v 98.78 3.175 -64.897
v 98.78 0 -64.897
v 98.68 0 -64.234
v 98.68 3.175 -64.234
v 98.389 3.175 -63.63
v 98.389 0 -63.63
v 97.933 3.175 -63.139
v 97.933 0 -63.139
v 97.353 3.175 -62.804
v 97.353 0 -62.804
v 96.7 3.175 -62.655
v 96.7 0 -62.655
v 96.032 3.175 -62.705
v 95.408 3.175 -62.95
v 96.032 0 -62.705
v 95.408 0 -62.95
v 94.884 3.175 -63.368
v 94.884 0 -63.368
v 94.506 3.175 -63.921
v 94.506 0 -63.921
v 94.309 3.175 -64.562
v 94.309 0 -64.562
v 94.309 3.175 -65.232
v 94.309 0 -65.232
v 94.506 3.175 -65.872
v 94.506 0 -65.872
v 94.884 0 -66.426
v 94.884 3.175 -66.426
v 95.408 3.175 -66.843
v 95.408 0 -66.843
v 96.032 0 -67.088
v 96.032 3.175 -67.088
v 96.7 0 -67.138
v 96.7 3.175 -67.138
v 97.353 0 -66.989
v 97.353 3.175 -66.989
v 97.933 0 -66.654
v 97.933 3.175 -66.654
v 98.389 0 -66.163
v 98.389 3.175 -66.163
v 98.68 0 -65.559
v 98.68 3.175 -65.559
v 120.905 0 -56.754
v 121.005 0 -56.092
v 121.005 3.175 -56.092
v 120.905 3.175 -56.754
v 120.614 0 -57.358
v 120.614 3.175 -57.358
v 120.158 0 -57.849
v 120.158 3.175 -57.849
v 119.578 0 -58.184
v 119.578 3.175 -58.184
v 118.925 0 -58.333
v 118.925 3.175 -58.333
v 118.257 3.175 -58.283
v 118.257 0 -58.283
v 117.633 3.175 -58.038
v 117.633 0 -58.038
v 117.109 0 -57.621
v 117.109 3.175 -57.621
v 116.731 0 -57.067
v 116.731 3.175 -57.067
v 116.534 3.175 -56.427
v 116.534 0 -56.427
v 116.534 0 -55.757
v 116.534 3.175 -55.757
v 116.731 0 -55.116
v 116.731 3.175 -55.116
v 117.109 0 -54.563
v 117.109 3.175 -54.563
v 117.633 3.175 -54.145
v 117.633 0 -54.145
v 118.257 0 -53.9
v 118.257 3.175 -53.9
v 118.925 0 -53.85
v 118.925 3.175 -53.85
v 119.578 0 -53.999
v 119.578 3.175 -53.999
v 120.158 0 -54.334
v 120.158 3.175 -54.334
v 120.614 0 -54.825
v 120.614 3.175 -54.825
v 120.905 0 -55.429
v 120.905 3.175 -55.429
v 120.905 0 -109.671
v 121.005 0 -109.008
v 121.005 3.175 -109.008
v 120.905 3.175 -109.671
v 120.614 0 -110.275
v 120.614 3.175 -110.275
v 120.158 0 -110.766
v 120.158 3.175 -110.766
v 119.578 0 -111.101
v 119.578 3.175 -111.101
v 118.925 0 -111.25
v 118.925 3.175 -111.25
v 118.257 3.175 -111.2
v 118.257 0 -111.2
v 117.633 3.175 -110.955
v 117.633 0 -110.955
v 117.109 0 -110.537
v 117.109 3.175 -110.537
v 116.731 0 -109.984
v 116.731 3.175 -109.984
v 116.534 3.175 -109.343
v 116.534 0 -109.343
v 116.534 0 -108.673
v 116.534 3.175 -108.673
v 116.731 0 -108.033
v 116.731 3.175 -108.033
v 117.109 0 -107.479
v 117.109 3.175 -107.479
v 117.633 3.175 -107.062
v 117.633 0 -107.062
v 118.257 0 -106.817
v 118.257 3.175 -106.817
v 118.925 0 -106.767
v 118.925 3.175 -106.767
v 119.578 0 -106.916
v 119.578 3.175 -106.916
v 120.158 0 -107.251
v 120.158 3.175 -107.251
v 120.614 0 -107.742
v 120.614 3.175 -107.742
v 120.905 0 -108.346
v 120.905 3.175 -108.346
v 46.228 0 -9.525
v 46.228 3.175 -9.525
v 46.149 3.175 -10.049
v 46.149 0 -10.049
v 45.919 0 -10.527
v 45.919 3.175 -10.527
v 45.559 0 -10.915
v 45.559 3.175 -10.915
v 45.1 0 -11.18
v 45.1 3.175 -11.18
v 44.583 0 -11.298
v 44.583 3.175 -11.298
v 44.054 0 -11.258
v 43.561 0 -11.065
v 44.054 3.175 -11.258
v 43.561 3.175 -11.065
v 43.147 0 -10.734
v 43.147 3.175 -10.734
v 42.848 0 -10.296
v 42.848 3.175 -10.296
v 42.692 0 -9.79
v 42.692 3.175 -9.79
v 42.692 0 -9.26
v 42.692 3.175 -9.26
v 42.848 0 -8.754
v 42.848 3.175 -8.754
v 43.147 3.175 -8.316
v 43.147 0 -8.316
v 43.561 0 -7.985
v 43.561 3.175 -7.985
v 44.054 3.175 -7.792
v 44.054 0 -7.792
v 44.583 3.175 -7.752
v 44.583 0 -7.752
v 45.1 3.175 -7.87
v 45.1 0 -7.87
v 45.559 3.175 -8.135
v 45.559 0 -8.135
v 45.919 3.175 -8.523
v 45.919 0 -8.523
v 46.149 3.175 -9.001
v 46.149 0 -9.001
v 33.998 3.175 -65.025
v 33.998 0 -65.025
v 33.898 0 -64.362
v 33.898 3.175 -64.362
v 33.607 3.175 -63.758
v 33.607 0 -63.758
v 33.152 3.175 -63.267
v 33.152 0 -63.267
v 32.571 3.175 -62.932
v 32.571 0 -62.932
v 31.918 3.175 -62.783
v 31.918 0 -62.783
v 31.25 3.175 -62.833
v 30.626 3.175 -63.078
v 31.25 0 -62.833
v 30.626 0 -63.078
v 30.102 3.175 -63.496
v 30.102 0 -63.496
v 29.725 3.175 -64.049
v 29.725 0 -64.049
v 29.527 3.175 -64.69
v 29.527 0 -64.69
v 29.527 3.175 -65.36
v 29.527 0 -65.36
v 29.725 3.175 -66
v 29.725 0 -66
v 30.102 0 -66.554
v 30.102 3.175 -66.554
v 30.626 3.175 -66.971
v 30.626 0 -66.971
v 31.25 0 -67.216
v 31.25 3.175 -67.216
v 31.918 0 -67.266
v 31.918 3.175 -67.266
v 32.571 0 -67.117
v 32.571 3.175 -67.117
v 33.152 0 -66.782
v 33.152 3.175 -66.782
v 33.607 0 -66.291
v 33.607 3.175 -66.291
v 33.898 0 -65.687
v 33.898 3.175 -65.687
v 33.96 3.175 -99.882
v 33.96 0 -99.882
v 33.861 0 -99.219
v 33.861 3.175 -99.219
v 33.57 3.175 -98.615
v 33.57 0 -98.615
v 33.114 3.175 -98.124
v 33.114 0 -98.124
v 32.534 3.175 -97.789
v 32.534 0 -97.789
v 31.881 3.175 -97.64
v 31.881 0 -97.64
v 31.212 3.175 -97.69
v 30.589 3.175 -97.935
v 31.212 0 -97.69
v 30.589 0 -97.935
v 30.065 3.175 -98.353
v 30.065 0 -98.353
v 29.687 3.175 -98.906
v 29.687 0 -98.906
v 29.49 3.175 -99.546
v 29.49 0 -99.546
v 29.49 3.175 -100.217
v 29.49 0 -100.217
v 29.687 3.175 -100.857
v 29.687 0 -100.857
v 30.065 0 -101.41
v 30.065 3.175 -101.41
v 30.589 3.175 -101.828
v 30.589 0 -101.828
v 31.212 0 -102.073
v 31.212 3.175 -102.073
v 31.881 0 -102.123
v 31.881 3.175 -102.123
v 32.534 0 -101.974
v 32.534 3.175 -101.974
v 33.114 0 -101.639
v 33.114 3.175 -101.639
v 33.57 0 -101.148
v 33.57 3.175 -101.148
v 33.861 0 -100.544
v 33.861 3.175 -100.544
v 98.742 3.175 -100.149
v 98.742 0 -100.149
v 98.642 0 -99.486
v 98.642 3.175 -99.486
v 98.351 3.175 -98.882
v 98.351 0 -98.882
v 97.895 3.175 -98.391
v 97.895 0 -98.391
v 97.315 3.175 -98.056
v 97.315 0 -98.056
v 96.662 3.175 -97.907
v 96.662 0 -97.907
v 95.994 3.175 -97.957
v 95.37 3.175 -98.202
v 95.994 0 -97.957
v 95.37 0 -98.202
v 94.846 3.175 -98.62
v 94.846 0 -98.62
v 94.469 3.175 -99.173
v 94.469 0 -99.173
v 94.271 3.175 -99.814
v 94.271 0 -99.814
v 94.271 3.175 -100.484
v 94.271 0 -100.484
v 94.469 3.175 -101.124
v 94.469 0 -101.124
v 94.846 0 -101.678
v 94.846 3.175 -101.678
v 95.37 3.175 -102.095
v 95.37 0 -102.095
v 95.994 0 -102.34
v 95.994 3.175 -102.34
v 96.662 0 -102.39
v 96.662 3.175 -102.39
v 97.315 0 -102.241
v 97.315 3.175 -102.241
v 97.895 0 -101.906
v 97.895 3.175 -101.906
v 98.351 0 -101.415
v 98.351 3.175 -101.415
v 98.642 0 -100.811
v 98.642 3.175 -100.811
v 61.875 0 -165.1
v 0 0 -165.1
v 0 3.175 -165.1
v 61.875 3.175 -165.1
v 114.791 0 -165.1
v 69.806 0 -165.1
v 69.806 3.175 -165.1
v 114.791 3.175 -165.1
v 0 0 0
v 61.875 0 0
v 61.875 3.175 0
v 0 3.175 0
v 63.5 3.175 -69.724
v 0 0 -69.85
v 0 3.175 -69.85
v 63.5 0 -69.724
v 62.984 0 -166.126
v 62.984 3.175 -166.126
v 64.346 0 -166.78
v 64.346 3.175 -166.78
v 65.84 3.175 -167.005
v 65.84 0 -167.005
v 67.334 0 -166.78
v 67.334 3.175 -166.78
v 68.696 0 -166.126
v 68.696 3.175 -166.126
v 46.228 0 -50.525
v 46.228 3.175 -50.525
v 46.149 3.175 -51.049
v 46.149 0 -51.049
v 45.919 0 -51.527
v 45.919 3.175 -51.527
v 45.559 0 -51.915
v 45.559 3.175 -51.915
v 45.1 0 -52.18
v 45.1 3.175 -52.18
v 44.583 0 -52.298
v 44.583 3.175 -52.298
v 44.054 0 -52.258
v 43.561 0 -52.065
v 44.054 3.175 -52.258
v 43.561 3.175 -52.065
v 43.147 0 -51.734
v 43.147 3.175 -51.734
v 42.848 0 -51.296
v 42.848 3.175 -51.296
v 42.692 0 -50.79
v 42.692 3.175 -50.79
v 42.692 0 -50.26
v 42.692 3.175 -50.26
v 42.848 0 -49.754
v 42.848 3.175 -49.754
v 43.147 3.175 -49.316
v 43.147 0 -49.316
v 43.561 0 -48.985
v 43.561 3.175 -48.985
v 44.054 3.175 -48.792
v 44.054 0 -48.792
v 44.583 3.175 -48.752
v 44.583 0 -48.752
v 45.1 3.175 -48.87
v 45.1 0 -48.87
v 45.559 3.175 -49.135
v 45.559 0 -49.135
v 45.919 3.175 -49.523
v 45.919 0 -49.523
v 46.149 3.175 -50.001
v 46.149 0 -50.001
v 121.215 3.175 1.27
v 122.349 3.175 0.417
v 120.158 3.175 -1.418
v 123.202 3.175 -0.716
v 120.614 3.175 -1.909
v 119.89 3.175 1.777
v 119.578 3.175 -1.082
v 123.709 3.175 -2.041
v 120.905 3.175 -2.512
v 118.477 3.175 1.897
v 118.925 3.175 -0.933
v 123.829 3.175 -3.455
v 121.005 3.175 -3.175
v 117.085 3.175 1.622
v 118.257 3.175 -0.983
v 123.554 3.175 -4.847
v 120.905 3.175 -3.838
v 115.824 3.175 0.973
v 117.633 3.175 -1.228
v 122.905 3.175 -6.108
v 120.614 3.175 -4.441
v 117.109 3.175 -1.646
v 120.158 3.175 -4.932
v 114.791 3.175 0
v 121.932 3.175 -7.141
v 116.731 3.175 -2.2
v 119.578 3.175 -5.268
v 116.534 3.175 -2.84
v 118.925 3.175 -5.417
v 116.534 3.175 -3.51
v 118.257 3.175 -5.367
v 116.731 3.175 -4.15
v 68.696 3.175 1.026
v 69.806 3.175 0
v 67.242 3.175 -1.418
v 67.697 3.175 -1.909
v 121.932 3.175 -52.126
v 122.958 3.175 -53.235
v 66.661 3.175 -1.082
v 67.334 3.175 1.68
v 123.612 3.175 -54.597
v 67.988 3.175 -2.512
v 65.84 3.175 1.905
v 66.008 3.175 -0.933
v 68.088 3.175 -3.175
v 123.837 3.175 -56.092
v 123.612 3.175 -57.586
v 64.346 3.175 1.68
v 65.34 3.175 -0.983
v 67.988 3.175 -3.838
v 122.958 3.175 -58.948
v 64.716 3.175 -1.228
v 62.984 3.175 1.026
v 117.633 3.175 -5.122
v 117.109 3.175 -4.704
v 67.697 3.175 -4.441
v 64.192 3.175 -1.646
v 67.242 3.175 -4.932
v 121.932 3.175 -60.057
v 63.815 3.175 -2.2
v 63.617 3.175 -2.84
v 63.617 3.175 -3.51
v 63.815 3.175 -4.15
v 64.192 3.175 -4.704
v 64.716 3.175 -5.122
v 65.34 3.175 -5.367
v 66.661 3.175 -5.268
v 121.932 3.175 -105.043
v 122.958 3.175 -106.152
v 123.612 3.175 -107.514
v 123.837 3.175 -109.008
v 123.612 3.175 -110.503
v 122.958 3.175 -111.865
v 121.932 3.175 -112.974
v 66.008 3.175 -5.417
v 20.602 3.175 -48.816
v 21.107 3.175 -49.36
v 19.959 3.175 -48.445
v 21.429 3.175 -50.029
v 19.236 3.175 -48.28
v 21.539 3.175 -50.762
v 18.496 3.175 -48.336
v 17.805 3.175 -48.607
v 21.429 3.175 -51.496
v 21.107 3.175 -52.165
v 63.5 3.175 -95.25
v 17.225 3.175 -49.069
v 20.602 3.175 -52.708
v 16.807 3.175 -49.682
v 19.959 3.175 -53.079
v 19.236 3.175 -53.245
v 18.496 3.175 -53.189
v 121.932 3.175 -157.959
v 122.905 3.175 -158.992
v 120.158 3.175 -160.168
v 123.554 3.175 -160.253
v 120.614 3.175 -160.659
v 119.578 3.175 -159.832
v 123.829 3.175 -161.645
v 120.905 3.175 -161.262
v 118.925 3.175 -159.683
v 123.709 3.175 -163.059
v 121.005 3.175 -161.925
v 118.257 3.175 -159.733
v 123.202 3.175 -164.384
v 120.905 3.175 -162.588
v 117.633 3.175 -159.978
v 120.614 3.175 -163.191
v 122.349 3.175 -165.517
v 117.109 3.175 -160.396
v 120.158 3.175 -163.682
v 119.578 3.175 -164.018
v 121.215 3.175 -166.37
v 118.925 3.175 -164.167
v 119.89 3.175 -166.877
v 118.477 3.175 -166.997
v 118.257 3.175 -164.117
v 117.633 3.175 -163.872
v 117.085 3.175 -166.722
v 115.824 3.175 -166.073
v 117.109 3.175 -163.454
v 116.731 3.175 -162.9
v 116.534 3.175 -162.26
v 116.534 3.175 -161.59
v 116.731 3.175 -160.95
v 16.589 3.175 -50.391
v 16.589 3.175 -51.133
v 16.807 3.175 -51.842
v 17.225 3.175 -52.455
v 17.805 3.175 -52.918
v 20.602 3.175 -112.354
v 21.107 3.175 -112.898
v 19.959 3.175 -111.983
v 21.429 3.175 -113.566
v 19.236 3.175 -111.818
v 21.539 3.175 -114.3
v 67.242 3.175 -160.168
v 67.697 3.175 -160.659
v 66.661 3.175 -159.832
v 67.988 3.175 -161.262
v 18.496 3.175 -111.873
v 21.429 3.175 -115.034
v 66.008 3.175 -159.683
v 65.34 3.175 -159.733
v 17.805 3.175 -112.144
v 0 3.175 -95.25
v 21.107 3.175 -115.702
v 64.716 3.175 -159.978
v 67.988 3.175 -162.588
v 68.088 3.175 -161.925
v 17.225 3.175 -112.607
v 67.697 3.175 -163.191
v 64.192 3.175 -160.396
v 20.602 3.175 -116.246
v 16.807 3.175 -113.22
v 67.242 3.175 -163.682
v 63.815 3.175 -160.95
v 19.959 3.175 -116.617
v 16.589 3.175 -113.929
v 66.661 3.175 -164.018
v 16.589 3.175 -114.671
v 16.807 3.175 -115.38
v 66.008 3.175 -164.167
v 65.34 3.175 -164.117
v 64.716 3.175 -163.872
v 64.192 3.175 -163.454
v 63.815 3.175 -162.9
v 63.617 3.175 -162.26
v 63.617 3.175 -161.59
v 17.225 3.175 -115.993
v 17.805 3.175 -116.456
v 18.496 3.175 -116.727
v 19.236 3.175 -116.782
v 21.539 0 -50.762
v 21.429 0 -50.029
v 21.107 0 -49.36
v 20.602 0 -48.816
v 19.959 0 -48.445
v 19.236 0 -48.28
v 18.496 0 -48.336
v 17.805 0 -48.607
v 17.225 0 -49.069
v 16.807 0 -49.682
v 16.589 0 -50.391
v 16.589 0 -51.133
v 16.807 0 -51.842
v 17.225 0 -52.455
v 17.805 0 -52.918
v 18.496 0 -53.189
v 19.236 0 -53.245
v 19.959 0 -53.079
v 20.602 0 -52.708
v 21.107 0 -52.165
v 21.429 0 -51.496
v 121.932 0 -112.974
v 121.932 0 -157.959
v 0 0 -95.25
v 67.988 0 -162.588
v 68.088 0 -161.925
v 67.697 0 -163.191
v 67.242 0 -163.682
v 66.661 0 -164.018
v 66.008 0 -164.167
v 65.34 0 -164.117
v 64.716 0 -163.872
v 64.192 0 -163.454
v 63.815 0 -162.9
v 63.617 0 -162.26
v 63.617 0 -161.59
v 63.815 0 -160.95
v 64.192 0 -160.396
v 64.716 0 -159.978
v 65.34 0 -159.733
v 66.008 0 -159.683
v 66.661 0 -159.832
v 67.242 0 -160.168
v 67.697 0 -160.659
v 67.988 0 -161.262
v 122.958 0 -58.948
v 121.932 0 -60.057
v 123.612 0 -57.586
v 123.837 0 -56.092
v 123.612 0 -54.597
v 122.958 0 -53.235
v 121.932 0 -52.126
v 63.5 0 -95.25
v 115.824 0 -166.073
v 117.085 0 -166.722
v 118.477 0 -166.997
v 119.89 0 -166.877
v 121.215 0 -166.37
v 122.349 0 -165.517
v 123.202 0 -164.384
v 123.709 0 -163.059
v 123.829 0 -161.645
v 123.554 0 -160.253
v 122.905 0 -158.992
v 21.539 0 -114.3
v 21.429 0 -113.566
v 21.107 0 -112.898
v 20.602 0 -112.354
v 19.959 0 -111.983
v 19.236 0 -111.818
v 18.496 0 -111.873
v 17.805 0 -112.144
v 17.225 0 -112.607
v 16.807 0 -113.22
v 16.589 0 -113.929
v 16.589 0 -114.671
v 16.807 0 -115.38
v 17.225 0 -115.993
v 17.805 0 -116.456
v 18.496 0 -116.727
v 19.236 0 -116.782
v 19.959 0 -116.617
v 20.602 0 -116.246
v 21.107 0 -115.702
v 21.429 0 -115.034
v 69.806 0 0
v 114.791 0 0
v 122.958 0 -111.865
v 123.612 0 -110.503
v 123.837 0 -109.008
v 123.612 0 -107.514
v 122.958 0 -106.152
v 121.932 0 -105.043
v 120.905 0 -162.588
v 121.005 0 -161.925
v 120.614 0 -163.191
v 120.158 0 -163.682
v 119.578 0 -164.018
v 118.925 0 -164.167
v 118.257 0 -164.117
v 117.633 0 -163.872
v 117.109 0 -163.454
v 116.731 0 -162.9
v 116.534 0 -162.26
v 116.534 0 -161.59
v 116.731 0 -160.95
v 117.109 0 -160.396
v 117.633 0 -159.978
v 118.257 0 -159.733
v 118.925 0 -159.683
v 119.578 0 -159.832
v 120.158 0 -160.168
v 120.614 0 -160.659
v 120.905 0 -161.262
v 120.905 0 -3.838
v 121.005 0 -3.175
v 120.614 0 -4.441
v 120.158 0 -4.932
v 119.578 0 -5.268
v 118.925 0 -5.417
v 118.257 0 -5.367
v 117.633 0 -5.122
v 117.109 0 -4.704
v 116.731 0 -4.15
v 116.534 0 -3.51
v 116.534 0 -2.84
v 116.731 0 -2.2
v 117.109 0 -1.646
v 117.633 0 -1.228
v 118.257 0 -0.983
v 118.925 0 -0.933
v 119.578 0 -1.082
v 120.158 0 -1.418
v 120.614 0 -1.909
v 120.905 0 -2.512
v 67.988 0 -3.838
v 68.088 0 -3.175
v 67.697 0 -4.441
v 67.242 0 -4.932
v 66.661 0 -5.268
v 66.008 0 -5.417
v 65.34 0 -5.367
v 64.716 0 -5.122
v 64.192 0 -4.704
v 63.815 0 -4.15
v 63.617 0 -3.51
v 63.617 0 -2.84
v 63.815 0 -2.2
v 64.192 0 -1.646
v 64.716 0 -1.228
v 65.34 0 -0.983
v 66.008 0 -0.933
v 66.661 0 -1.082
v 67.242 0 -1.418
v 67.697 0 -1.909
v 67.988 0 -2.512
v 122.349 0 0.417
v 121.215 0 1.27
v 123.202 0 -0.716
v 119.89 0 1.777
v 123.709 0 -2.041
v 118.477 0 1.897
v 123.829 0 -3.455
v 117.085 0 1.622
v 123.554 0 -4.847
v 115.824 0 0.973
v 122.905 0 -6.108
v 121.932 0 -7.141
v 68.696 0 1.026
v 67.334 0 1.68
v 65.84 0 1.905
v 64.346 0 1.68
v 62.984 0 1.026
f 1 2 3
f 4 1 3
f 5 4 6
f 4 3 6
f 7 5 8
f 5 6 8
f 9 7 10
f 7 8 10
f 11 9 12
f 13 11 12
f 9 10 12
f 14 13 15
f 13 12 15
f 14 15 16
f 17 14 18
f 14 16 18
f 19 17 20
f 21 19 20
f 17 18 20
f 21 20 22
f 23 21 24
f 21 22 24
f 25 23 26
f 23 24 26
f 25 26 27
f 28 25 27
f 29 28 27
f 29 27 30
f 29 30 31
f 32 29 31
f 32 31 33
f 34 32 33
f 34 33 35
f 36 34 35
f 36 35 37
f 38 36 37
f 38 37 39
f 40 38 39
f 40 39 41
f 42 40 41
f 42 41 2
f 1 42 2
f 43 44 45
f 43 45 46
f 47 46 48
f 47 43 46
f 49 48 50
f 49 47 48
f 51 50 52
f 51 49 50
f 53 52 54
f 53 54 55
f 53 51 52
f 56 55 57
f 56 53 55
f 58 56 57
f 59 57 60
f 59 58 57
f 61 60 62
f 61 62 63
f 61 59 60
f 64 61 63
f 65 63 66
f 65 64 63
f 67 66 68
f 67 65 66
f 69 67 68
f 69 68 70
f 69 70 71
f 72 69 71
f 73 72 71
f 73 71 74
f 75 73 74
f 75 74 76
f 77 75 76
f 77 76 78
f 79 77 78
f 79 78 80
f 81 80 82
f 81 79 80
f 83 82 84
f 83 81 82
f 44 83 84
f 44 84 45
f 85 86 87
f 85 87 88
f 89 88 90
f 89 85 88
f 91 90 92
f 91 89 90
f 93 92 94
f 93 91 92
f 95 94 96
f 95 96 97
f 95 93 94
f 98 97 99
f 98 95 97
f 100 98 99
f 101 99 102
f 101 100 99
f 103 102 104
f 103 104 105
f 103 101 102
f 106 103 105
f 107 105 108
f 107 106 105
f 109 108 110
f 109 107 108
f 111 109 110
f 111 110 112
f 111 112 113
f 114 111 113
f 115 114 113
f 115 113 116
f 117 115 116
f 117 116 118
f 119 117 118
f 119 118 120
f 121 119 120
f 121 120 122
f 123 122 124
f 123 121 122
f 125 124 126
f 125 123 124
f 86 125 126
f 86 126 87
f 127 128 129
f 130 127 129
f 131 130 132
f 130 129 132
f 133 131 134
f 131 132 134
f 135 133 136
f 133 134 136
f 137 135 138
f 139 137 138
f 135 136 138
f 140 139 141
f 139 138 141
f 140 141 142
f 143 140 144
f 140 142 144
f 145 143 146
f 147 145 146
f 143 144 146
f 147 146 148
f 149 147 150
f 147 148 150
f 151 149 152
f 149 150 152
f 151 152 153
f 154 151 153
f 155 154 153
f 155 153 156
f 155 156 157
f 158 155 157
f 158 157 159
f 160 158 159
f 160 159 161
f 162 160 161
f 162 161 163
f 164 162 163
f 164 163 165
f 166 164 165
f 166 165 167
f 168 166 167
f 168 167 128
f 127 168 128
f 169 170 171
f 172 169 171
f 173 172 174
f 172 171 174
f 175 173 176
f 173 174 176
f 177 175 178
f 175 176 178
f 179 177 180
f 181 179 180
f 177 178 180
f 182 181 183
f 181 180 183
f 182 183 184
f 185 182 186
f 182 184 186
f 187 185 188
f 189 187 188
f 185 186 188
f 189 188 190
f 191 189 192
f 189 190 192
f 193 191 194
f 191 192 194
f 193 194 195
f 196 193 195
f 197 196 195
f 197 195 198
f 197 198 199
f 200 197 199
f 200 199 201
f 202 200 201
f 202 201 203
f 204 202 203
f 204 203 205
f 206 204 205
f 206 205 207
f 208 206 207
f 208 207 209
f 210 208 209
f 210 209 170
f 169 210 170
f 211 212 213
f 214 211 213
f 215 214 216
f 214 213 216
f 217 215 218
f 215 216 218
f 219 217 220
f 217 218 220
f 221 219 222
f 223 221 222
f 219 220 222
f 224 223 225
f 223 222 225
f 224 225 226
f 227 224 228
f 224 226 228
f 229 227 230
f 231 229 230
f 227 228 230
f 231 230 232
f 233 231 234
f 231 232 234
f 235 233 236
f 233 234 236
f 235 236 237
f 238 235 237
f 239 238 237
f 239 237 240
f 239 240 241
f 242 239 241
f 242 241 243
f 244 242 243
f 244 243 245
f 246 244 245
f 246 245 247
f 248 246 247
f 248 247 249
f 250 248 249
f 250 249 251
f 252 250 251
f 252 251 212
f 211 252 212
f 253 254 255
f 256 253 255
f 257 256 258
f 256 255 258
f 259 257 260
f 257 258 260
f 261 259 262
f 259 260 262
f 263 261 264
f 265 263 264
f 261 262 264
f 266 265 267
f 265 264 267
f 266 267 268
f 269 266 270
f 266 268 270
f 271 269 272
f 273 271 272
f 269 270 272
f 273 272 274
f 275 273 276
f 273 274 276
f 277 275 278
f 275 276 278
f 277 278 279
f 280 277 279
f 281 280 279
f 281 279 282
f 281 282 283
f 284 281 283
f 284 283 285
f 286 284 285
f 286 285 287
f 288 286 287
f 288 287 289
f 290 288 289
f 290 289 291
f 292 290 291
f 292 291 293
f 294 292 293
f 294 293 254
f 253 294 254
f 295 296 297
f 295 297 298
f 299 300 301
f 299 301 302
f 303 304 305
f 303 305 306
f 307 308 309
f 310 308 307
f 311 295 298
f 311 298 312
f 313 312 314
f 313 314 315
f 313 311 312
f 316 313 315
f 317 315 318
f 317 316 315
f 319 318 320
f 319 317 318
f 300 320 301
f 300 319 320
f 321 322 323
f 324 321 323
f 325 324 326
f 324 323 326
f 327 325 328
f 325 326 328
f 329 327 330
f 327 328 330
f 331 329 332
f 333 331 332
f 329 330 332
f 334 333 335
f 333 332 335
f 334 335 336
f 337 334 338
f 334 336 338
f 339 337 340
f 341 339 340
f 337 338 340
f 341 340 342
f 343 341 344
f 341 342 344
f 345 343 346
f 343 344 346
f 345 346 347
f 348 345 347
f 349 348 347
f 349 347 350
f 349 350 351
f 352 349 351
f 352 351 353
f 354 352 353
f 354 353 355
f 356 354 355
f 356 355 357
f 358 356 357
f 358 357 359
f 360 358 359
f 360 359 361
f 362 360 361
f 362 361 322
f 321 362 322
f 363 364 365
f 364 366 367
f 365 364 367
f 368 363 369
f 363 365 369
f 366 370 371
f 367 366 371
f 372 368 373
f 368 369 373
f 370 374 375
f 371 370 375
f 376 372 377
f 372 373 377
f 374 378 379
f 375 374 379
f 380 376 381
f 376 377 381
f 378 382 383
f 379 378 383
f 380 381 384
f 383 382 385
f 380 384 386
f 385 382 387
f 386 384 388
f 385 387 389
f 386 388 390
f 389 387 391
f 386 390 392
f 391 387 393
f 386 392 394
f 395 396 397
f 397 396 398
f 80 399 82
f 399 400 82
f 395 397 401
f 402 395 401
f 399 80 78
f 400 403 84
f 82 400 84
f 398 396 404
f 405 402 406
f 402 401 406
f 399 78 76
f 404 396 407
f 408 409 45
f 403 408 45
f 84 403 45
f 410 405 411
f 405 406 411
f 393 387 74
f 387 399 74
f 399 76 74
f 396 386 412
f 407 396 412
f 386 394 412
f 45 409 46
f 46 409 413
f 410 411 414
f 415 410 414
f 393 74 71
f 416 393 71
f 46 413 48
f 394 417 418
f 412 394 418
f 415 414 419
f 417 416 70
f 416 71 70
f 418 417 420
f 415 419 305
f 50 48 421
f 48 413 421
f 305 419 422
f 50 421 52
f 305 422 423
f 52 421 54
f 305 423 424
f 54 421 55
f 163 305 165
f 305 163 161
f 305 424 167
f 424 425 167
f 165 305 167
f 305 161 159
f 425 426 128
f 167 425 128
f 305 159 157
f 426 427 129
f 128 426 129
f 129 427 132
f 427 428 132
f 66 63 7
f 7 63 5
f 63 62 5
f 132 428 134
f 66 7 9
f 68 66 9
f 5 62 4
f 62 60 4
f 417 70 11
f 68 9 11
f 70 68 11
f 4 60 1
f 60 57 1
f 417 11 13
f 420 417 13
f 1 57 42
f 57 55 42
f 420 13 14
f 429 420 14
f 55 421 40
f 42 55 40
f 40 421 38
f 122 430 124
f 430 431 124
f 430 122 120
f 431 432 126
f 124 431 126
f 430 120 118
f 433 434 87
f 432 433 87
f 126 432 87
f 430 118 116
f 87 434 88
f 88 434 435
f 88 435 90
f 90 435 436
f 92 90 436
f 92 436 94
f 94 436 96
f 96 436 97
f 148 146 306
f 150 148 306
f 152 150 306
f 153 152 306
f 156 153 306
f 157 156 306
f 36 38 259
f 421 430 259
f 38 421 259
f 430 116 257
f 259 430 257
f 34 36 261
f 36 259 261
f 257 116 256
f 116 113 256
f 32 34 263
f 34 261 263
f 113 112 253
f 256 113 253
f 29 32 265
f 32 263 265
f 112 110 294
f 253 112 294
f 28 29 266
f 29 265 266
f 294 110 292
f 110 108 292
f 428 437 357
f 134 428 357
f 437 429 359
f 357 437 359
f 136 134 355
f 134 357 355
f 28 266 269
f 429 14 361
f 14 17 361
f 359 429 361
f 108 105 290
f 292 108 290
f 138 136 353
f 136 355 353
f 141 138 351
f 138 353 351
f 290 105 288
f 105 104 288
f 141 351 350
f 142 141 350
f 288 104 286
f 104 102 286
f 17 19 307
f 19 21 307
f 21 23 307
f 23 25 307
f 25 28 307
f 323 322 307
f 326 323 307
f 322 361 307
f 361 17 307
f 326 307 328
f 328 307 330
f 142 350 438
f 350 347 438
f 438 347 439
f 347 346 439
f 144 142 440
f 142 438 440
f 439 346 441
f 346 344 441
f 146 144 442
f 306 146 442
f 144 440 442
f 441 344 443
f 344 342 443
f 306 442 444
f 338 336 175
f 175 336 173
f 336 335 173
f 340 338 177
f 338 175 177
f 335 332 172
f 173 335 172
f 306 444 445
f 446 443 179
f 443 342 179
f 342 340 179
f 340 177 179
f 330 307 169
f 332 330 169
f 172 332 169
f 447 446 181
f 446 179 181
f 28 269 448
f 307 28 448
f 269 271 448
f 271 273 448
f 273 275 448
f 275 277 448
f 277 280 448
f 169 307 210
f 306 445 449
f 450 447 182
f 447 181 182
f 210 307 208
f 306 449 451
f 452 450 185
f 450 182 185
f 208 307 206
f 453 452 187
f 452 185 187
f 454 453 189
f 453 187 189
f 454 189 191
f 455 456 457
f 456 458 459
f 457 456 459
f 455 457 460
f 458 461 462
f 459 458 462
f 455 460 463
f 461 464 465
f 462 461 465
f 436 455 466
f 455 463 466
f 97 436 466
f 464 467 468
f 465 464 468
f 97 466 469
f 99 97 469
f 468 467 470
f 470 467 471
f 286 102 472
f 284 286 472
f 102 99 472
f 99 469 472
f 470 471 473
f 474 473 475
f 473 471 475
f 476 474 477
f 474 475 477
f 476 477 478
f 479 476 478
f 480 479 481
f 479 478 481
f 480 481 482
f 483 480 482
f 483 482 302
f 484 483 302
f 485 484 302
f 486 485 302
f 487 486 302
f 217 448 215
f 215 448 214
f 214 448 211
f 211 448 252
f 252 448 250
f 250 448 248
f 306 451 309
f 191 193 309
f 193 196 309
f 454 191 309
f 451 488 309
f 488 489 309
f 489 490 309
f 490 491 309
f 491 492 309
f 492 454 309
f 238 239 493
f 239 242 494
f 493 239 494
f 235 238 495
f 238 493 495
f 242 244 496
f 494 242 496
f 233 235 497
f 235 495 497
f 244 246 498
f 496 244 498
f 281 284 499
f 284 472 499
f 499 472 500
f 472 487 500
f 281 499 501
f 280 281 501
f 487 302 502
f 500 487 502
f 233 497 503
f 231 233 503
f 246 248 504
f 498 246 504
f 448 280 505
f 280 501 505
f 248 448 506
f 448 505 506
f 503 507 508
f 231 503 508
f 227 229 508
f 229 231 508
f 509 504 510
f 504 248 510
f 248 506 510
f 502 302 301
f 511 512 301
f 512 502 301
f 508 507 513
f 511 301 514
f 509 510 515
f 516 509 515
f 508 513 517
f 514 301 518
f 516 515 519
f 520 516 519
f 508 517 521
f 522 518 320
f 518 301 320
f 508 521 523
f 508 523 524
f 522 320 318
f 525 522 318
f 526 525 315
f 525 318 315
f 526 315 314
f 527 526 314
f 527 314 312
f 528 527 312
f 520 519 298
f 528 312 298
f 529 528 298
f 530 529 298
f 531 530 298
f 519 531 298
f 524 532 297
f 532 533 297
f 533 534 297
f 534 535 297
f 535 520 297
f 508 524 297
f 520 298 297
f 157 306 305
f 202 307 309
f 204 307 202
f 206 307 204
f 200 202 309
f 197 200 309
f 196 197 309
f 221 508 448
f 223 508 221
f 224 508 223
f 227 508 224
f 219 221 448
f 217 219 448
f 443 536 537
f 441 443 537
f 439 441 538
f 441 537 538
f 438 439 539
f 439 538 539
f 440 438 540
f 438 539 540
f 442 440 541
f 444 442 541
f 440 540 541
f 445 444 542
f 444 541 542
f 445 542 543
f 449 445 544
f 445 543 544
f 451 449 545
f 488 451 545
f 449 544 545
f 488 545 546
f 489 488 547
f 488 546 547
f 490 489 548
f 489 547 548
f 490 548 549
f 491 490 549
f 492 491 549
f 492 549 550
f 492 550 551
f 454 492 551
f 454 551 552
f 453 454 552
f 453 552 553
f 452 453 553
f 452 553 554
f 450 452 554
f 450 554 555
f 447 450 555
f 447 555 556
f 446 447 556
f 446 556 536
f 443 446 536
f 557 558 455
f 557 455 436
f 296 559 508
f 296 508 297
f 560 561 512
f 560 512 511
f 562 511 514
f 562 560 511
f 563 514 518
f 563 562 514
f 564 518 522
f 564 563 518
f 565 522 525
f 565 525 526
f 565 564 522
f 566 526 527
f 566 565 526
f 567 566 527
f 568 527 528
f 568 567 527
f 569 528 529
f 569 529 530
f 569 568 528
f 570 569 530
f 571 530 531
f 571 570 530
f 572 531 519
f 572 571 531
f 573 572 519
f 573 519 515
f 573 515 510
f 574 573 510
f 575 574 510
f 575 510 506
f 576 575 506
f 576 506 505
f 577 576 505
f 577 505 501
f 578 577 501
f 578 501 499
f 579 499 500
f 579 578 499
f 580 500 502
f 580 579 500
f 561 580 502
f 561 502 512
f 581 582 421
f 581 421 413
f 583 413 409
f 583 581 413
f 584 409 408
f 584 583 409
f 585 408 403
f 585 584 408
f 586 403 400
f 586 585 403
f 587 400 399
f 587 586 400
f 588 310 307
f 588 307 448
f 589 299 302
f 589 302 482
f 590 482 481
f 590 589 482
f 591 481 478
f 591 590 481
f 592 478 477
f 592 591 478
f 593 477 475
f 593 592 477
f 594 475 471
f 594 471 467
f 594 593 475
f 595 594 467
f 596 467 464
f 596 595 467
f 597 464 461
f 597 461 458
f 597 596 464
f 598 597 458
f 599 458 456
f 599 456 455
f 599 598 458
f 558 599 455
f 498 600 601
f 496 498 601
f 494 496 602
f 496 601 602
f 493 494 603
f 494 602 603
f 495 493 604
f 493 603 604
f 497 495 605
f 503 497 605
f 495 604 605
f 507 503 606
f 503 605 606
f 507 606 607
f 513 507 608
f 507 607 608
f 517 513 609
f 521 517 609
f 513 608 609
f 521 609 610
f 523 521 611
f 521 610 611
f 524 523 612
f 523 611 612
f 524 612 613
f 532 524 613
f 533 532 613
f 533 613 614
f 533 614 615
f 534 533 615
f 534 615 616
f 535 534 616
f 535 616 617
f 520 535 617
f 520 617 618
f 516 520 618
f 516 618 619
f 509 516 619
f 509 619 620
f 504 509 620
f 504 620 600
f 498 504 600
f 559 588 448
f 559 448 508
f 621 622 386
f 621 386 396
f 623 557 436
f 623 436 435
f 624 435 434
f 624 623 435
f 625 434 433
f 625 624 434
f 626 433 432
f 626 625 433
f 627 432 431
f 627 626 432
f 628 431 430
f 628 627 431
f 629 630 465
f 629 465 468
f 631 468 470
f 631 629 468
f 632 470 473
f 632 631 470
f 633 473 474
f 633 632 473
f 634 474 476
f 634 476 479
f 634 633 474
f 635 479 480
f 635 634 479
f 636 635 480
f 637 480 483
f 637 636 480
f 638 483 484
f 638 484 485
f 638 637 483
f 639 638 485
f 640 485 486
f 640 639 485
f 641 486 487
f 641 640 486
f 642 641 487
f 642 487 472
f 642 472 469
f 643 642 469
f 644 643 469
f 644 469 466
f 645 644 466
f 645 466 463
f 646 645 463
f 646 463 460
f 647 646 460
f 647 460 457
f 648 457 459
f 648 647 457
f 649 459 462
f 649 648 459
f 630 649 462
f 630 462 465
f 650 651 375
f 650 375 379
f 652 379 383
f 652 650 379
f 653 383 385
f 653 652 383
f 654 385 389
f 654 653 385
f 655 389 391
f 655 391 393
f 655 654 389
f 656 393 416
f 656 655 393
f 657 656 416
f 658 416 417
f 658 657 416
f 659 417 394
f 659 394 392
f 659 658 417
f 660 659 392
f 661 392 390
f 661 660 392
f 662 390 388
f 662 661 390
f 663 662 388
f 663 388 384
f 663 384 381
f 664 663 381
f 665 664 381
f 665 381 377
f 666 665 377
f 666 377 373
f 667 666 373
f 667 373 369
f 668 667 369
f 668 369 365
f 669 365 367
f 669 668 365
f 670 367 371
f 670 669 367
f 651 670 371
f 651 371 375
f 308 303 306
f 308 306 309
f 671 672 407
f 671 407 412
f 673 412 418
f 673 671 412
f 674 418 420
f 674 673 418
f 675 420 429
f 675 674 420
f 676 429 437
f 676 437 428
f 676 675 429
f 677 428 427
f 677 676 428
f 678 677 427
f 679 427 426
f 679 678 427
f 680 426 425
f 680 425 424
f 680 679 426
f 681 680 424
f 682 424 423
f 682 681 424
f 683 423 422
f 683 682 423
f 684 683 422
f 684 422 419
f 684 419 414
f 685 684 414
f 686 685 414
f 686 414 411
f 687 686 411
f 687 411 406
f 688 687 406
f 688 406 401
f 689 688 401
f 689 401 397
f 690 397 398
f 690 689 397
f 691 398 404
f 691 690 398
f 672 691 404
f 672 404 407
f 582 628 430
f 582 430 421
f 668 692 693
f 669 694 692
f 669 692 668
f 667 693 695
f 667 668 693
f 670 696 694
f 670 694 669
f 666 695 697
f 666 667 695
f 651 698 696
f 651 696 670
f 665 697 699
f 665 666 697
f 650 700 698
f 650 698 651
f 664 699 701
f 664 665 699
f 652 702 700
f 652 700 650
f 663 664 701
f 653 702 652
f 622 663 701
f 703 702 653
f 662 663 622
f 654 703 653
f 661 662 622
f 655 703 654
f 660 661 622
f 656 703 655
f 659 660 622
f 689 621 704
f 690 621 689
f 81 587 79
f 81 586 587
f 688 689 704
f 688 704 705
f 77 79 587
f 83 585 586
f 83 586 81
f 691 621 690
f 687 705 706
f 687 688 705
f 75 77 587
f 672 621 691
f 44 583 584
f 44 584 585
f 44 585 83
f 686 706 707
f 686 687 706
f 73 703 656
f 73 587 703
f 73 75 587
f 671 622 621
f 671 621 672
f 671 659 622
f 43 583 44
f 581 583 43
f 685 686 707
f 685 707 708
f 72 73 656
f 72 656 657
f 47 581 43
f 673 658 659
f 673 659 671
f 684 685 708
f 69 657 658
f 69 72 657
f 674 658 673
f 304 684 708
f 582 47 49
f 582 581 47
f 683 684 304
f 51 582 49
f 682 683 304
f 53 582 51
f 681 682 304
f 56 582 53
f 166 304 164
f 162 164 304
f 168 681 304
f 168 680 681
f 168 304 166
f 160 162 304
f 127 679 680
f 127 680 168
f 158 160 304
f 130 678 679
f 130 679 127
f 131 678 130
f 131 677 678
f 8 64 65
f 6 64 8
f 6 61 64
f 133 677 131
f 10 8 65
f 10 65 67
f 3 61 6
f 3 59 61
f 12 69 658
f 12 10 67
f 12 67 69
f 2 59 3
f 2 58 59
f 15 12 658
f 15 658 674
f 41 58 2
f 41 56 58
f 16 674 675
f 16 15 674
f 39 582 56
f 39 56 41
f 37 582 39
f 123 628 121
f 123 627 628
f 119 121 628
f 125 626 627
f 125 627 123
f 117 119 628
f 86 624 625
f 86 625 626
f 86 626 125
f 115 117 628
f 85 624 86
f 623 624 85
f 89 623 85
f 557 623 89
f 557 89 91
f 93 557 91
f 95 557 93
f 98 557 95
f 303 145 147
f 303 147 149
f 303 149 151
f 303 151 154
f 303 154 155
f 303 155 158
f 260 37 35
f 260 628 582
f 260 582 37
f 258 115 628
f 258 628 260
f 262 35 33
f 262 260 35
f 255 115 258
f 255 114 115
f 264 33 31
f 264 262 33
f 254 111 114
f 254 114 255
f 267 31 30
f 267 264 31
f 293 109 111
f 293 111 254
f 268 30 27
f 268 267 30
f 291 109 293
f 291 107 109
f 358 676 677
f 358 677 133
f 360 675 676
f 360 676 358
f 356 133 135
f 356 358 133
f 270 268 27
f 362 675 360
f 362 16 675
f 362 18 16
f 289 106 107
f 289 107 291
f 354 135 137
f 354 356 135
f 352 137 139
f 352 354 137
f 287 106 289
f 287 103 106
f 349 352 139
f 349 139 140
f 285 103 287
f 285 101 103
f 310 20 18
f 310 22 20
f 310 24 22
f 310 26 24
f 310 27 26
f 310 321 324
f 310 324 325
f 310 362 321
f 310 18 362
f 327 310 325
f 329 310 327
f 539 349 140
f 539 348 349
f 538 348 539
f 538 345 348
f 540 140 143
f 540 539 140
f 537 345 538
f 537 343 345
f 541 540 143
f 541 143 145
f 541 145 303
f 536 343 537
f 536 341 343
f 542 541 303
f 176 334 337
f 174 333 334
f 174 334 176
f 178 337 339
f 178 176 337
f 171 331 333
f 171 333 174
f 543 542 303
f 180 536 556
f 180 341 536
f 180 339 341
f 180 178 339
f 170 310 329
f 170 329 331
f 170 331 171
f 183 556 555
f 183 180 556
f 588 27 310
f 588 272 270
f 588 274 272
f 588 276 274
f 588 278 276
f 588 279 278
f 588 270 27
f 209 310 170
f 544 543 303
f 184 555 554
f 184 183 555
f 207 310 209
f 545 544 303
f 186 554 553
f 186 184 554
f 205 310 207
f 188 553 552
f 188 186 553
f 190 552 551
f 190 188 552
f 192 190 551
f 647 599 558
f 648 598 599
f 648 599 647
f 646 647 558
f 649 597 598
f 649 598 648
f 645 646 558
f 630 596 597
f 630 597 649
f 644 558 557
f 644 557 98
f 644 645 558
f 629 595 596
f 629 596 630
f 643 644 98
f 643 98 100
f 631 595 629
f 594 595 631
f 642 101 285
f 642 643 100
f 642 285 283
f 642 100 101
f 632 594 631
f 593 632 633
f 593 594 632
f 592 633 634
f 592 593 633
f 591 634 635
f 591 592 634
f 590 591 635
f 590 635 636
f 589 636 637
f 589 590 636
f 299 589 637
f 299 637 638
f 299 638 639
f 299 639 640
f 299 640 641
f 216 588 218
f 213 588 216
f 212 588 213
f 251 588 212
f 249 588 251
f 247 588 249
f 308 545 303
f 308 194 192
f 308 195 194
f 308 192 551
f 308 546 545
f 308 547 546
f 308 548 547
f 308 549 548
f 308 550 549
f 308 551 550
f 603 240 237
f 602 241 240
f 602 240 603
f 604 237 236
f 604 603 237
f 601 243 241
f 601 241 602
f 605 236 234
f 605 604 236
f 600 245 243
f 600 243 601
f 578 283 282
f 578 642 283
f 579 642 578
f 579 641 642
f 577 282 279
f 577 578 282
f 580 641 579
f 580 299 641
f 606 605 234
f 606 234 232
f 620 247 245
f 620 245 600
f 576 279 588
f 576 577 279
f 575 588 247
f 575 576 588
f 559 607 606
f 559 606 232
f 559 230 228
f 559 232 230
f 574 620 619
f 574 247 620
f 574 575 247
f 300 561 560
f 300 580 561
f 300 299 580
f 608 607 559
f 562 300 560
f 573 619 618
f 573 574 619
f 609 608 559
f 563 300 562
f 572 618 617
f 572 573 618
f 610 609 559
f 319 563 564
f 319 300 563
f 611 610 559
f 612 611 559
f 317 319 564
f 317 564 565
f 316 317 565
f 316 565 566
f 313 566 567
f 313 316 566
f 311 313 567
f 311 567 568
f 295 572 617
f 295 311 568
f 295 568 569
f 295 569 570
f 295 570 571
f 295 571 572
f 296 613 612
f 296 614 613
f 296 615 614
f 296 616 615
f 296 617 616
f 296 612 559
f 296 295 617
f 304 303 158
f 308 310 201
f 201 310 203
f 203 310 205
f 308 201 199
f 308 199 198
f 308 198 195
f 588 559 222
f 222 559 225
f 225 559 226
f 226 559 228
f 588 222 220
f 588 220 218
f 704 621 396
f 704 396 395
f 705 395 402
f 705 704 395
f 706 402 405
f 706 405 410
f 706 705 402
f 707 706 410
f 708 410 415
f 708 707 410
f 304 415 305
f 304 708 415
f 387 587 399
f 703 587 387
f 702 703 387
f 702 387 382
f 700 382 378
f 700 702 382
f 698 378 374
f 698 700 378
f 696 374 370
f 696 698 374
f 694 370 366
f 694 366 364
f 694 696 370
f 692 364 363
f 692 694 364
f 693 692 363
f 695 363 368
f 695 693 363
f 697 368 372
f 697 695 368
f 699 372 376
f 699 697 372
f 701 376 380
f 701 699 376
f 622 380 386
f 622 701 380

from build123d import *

# Parameters (mm, degrees)
SKETCH1_R           = 2.2479
BOSS_EXTRUDE1_DEPTH = 3.175
SKETCH2_R           = 2.4892
SKETCH2_R_2         = 2.2479
CUT_EXTRUDE1_DEPTH  = 4.175
SKETCH3_R           = 1.778
CUT_EXTRUDE2_DEPTH  = 4.175


with BuildPart() as part:
    # Sketch1 → Boss-Extrude1 (new body)
    with BuildSketch(Plane(origin=(0, 0, 0), x_dir=(1, 0, 0), z_dir=(0, 1, 0))):
        with BuildLine():
            Line((0, 165.1), (61.874509804, 165.1))
            ThreePointArc((61.874509804, 165.1), (65.840083533, 167.005), (69.805657262, 165.1))
            Line((69.805657262, 165.1), (114.791176471, 165.1))
            ThreePointArc((114.791176471, 165.1), (122.348852648, 165.517102448), (121.9317502, 157.959426271))
            Line((121.9317502, 157.959426271), (121.9317502, 112.973907062))
            ThreePointArc((121.9317502, 112.973907062), (123.8367502, 109.008333333), (121.9317502, 105.042759604))
            Line((121.9317502, 105.042759604), (121.9317502, 60.057240396))
            ThreePointArc((121.9317502, 60.057240396), (123.8367502, 56.091666667), (121.9317502, 52.126092938))
            Line((121.9317502, 52.126092938), (121.9317502, 7.140573729))
            ThreePointArc((121.9317502, 7.140573729), (122.348852648, -0.417102448), (114.791176471, 0))
            Line((114.791176471, 0), (69.805657262, 0))
            ThreePointArc((69.805657262, 0), (65.840083533, -1.905), (61.874509804, 0))
            Line((61.874509804, 0), (0, 0))
            Line((0, 0), (0, 69.85))
            Line((0, 69.85), (63.5, 69.72449217))
            Line((63.5, 69.72449217), (63.5, 95.25))
            Line((63.5, 95.25), (0, 95.25))
            Line((0, 95.25), (0, 165.1))
        make_face()
        with Locations((65.840083533, 3.175)):
            Circle(SKETCH1_R, mode=Mode.SUBTRACT)
        with Locations((118.7567502, 3.175)):
            Circle(SKETCH1_R, mode=Mode.SUBTRACT)
        with Locations((118.7567502, 56.091666667)):
            Circle(SKETCH1_R, mode=Mode.SUBTRACT)
        with Locations((118.7567502, 109.008333333)):
            Circle(SKETCH1_R, mode=Mode.SUBTRACT)
        with Locations((118.7567502, 161.925)):
            Circle(SKETCH1_R, mode=Mode.SUBTRACT)
        with Locations((65.840083533, 161.925)):
            Circle(SKETCH1_R, mode=Mode.SUBTRACT)
    extrude(amount=BOSS_EXTRUDE1_DEPTH)

    # Sketch2 → Cut-Extrude1 (cut, through all)
    with BuildSketch(Plane.XZ):
        with Locations((19.05, -50.762310441)):
            Circle(SKETCH2_R)
        with Locations((19.05, -114.3)):
            Circle(SKETCH2_R)
        with Locations((31.75, -65.024736783)):
            Circle(SKETCH2_R_2)
        with Locations((96.5317502, -64.896695572)):
            Circle(SKETCH2_R_2)
        with Locations((96.493890617, -100.14870612)):
            Circle(SKETCH2_R_2)
        with Locations((31.712564881, -99.881518123)):
            Circle(SKETCH2_R_2)
    extrude(amount=-CUT_EXTRUDE1_DEPTH, mode=Mode.SUBTRACT)

    # Sketch3 → Cut-Extrude2 (cut, through all)
    with BuildSketch(Plane(origin=(0, 3.175, 0), x_dir=(1, 0, 0), z_dir=(0, 1, 0))):
        with Locations((44.45, 9.525)):
            Circle(SKETCH3_R)
        with Locations((44.45, 50.525)):
            Circle(SKETCH3_R)
    extrude(amount=-CUT_EXTRUDE2_DEPTH, mode=Mode.SUBTRACT)


solid = part.part
